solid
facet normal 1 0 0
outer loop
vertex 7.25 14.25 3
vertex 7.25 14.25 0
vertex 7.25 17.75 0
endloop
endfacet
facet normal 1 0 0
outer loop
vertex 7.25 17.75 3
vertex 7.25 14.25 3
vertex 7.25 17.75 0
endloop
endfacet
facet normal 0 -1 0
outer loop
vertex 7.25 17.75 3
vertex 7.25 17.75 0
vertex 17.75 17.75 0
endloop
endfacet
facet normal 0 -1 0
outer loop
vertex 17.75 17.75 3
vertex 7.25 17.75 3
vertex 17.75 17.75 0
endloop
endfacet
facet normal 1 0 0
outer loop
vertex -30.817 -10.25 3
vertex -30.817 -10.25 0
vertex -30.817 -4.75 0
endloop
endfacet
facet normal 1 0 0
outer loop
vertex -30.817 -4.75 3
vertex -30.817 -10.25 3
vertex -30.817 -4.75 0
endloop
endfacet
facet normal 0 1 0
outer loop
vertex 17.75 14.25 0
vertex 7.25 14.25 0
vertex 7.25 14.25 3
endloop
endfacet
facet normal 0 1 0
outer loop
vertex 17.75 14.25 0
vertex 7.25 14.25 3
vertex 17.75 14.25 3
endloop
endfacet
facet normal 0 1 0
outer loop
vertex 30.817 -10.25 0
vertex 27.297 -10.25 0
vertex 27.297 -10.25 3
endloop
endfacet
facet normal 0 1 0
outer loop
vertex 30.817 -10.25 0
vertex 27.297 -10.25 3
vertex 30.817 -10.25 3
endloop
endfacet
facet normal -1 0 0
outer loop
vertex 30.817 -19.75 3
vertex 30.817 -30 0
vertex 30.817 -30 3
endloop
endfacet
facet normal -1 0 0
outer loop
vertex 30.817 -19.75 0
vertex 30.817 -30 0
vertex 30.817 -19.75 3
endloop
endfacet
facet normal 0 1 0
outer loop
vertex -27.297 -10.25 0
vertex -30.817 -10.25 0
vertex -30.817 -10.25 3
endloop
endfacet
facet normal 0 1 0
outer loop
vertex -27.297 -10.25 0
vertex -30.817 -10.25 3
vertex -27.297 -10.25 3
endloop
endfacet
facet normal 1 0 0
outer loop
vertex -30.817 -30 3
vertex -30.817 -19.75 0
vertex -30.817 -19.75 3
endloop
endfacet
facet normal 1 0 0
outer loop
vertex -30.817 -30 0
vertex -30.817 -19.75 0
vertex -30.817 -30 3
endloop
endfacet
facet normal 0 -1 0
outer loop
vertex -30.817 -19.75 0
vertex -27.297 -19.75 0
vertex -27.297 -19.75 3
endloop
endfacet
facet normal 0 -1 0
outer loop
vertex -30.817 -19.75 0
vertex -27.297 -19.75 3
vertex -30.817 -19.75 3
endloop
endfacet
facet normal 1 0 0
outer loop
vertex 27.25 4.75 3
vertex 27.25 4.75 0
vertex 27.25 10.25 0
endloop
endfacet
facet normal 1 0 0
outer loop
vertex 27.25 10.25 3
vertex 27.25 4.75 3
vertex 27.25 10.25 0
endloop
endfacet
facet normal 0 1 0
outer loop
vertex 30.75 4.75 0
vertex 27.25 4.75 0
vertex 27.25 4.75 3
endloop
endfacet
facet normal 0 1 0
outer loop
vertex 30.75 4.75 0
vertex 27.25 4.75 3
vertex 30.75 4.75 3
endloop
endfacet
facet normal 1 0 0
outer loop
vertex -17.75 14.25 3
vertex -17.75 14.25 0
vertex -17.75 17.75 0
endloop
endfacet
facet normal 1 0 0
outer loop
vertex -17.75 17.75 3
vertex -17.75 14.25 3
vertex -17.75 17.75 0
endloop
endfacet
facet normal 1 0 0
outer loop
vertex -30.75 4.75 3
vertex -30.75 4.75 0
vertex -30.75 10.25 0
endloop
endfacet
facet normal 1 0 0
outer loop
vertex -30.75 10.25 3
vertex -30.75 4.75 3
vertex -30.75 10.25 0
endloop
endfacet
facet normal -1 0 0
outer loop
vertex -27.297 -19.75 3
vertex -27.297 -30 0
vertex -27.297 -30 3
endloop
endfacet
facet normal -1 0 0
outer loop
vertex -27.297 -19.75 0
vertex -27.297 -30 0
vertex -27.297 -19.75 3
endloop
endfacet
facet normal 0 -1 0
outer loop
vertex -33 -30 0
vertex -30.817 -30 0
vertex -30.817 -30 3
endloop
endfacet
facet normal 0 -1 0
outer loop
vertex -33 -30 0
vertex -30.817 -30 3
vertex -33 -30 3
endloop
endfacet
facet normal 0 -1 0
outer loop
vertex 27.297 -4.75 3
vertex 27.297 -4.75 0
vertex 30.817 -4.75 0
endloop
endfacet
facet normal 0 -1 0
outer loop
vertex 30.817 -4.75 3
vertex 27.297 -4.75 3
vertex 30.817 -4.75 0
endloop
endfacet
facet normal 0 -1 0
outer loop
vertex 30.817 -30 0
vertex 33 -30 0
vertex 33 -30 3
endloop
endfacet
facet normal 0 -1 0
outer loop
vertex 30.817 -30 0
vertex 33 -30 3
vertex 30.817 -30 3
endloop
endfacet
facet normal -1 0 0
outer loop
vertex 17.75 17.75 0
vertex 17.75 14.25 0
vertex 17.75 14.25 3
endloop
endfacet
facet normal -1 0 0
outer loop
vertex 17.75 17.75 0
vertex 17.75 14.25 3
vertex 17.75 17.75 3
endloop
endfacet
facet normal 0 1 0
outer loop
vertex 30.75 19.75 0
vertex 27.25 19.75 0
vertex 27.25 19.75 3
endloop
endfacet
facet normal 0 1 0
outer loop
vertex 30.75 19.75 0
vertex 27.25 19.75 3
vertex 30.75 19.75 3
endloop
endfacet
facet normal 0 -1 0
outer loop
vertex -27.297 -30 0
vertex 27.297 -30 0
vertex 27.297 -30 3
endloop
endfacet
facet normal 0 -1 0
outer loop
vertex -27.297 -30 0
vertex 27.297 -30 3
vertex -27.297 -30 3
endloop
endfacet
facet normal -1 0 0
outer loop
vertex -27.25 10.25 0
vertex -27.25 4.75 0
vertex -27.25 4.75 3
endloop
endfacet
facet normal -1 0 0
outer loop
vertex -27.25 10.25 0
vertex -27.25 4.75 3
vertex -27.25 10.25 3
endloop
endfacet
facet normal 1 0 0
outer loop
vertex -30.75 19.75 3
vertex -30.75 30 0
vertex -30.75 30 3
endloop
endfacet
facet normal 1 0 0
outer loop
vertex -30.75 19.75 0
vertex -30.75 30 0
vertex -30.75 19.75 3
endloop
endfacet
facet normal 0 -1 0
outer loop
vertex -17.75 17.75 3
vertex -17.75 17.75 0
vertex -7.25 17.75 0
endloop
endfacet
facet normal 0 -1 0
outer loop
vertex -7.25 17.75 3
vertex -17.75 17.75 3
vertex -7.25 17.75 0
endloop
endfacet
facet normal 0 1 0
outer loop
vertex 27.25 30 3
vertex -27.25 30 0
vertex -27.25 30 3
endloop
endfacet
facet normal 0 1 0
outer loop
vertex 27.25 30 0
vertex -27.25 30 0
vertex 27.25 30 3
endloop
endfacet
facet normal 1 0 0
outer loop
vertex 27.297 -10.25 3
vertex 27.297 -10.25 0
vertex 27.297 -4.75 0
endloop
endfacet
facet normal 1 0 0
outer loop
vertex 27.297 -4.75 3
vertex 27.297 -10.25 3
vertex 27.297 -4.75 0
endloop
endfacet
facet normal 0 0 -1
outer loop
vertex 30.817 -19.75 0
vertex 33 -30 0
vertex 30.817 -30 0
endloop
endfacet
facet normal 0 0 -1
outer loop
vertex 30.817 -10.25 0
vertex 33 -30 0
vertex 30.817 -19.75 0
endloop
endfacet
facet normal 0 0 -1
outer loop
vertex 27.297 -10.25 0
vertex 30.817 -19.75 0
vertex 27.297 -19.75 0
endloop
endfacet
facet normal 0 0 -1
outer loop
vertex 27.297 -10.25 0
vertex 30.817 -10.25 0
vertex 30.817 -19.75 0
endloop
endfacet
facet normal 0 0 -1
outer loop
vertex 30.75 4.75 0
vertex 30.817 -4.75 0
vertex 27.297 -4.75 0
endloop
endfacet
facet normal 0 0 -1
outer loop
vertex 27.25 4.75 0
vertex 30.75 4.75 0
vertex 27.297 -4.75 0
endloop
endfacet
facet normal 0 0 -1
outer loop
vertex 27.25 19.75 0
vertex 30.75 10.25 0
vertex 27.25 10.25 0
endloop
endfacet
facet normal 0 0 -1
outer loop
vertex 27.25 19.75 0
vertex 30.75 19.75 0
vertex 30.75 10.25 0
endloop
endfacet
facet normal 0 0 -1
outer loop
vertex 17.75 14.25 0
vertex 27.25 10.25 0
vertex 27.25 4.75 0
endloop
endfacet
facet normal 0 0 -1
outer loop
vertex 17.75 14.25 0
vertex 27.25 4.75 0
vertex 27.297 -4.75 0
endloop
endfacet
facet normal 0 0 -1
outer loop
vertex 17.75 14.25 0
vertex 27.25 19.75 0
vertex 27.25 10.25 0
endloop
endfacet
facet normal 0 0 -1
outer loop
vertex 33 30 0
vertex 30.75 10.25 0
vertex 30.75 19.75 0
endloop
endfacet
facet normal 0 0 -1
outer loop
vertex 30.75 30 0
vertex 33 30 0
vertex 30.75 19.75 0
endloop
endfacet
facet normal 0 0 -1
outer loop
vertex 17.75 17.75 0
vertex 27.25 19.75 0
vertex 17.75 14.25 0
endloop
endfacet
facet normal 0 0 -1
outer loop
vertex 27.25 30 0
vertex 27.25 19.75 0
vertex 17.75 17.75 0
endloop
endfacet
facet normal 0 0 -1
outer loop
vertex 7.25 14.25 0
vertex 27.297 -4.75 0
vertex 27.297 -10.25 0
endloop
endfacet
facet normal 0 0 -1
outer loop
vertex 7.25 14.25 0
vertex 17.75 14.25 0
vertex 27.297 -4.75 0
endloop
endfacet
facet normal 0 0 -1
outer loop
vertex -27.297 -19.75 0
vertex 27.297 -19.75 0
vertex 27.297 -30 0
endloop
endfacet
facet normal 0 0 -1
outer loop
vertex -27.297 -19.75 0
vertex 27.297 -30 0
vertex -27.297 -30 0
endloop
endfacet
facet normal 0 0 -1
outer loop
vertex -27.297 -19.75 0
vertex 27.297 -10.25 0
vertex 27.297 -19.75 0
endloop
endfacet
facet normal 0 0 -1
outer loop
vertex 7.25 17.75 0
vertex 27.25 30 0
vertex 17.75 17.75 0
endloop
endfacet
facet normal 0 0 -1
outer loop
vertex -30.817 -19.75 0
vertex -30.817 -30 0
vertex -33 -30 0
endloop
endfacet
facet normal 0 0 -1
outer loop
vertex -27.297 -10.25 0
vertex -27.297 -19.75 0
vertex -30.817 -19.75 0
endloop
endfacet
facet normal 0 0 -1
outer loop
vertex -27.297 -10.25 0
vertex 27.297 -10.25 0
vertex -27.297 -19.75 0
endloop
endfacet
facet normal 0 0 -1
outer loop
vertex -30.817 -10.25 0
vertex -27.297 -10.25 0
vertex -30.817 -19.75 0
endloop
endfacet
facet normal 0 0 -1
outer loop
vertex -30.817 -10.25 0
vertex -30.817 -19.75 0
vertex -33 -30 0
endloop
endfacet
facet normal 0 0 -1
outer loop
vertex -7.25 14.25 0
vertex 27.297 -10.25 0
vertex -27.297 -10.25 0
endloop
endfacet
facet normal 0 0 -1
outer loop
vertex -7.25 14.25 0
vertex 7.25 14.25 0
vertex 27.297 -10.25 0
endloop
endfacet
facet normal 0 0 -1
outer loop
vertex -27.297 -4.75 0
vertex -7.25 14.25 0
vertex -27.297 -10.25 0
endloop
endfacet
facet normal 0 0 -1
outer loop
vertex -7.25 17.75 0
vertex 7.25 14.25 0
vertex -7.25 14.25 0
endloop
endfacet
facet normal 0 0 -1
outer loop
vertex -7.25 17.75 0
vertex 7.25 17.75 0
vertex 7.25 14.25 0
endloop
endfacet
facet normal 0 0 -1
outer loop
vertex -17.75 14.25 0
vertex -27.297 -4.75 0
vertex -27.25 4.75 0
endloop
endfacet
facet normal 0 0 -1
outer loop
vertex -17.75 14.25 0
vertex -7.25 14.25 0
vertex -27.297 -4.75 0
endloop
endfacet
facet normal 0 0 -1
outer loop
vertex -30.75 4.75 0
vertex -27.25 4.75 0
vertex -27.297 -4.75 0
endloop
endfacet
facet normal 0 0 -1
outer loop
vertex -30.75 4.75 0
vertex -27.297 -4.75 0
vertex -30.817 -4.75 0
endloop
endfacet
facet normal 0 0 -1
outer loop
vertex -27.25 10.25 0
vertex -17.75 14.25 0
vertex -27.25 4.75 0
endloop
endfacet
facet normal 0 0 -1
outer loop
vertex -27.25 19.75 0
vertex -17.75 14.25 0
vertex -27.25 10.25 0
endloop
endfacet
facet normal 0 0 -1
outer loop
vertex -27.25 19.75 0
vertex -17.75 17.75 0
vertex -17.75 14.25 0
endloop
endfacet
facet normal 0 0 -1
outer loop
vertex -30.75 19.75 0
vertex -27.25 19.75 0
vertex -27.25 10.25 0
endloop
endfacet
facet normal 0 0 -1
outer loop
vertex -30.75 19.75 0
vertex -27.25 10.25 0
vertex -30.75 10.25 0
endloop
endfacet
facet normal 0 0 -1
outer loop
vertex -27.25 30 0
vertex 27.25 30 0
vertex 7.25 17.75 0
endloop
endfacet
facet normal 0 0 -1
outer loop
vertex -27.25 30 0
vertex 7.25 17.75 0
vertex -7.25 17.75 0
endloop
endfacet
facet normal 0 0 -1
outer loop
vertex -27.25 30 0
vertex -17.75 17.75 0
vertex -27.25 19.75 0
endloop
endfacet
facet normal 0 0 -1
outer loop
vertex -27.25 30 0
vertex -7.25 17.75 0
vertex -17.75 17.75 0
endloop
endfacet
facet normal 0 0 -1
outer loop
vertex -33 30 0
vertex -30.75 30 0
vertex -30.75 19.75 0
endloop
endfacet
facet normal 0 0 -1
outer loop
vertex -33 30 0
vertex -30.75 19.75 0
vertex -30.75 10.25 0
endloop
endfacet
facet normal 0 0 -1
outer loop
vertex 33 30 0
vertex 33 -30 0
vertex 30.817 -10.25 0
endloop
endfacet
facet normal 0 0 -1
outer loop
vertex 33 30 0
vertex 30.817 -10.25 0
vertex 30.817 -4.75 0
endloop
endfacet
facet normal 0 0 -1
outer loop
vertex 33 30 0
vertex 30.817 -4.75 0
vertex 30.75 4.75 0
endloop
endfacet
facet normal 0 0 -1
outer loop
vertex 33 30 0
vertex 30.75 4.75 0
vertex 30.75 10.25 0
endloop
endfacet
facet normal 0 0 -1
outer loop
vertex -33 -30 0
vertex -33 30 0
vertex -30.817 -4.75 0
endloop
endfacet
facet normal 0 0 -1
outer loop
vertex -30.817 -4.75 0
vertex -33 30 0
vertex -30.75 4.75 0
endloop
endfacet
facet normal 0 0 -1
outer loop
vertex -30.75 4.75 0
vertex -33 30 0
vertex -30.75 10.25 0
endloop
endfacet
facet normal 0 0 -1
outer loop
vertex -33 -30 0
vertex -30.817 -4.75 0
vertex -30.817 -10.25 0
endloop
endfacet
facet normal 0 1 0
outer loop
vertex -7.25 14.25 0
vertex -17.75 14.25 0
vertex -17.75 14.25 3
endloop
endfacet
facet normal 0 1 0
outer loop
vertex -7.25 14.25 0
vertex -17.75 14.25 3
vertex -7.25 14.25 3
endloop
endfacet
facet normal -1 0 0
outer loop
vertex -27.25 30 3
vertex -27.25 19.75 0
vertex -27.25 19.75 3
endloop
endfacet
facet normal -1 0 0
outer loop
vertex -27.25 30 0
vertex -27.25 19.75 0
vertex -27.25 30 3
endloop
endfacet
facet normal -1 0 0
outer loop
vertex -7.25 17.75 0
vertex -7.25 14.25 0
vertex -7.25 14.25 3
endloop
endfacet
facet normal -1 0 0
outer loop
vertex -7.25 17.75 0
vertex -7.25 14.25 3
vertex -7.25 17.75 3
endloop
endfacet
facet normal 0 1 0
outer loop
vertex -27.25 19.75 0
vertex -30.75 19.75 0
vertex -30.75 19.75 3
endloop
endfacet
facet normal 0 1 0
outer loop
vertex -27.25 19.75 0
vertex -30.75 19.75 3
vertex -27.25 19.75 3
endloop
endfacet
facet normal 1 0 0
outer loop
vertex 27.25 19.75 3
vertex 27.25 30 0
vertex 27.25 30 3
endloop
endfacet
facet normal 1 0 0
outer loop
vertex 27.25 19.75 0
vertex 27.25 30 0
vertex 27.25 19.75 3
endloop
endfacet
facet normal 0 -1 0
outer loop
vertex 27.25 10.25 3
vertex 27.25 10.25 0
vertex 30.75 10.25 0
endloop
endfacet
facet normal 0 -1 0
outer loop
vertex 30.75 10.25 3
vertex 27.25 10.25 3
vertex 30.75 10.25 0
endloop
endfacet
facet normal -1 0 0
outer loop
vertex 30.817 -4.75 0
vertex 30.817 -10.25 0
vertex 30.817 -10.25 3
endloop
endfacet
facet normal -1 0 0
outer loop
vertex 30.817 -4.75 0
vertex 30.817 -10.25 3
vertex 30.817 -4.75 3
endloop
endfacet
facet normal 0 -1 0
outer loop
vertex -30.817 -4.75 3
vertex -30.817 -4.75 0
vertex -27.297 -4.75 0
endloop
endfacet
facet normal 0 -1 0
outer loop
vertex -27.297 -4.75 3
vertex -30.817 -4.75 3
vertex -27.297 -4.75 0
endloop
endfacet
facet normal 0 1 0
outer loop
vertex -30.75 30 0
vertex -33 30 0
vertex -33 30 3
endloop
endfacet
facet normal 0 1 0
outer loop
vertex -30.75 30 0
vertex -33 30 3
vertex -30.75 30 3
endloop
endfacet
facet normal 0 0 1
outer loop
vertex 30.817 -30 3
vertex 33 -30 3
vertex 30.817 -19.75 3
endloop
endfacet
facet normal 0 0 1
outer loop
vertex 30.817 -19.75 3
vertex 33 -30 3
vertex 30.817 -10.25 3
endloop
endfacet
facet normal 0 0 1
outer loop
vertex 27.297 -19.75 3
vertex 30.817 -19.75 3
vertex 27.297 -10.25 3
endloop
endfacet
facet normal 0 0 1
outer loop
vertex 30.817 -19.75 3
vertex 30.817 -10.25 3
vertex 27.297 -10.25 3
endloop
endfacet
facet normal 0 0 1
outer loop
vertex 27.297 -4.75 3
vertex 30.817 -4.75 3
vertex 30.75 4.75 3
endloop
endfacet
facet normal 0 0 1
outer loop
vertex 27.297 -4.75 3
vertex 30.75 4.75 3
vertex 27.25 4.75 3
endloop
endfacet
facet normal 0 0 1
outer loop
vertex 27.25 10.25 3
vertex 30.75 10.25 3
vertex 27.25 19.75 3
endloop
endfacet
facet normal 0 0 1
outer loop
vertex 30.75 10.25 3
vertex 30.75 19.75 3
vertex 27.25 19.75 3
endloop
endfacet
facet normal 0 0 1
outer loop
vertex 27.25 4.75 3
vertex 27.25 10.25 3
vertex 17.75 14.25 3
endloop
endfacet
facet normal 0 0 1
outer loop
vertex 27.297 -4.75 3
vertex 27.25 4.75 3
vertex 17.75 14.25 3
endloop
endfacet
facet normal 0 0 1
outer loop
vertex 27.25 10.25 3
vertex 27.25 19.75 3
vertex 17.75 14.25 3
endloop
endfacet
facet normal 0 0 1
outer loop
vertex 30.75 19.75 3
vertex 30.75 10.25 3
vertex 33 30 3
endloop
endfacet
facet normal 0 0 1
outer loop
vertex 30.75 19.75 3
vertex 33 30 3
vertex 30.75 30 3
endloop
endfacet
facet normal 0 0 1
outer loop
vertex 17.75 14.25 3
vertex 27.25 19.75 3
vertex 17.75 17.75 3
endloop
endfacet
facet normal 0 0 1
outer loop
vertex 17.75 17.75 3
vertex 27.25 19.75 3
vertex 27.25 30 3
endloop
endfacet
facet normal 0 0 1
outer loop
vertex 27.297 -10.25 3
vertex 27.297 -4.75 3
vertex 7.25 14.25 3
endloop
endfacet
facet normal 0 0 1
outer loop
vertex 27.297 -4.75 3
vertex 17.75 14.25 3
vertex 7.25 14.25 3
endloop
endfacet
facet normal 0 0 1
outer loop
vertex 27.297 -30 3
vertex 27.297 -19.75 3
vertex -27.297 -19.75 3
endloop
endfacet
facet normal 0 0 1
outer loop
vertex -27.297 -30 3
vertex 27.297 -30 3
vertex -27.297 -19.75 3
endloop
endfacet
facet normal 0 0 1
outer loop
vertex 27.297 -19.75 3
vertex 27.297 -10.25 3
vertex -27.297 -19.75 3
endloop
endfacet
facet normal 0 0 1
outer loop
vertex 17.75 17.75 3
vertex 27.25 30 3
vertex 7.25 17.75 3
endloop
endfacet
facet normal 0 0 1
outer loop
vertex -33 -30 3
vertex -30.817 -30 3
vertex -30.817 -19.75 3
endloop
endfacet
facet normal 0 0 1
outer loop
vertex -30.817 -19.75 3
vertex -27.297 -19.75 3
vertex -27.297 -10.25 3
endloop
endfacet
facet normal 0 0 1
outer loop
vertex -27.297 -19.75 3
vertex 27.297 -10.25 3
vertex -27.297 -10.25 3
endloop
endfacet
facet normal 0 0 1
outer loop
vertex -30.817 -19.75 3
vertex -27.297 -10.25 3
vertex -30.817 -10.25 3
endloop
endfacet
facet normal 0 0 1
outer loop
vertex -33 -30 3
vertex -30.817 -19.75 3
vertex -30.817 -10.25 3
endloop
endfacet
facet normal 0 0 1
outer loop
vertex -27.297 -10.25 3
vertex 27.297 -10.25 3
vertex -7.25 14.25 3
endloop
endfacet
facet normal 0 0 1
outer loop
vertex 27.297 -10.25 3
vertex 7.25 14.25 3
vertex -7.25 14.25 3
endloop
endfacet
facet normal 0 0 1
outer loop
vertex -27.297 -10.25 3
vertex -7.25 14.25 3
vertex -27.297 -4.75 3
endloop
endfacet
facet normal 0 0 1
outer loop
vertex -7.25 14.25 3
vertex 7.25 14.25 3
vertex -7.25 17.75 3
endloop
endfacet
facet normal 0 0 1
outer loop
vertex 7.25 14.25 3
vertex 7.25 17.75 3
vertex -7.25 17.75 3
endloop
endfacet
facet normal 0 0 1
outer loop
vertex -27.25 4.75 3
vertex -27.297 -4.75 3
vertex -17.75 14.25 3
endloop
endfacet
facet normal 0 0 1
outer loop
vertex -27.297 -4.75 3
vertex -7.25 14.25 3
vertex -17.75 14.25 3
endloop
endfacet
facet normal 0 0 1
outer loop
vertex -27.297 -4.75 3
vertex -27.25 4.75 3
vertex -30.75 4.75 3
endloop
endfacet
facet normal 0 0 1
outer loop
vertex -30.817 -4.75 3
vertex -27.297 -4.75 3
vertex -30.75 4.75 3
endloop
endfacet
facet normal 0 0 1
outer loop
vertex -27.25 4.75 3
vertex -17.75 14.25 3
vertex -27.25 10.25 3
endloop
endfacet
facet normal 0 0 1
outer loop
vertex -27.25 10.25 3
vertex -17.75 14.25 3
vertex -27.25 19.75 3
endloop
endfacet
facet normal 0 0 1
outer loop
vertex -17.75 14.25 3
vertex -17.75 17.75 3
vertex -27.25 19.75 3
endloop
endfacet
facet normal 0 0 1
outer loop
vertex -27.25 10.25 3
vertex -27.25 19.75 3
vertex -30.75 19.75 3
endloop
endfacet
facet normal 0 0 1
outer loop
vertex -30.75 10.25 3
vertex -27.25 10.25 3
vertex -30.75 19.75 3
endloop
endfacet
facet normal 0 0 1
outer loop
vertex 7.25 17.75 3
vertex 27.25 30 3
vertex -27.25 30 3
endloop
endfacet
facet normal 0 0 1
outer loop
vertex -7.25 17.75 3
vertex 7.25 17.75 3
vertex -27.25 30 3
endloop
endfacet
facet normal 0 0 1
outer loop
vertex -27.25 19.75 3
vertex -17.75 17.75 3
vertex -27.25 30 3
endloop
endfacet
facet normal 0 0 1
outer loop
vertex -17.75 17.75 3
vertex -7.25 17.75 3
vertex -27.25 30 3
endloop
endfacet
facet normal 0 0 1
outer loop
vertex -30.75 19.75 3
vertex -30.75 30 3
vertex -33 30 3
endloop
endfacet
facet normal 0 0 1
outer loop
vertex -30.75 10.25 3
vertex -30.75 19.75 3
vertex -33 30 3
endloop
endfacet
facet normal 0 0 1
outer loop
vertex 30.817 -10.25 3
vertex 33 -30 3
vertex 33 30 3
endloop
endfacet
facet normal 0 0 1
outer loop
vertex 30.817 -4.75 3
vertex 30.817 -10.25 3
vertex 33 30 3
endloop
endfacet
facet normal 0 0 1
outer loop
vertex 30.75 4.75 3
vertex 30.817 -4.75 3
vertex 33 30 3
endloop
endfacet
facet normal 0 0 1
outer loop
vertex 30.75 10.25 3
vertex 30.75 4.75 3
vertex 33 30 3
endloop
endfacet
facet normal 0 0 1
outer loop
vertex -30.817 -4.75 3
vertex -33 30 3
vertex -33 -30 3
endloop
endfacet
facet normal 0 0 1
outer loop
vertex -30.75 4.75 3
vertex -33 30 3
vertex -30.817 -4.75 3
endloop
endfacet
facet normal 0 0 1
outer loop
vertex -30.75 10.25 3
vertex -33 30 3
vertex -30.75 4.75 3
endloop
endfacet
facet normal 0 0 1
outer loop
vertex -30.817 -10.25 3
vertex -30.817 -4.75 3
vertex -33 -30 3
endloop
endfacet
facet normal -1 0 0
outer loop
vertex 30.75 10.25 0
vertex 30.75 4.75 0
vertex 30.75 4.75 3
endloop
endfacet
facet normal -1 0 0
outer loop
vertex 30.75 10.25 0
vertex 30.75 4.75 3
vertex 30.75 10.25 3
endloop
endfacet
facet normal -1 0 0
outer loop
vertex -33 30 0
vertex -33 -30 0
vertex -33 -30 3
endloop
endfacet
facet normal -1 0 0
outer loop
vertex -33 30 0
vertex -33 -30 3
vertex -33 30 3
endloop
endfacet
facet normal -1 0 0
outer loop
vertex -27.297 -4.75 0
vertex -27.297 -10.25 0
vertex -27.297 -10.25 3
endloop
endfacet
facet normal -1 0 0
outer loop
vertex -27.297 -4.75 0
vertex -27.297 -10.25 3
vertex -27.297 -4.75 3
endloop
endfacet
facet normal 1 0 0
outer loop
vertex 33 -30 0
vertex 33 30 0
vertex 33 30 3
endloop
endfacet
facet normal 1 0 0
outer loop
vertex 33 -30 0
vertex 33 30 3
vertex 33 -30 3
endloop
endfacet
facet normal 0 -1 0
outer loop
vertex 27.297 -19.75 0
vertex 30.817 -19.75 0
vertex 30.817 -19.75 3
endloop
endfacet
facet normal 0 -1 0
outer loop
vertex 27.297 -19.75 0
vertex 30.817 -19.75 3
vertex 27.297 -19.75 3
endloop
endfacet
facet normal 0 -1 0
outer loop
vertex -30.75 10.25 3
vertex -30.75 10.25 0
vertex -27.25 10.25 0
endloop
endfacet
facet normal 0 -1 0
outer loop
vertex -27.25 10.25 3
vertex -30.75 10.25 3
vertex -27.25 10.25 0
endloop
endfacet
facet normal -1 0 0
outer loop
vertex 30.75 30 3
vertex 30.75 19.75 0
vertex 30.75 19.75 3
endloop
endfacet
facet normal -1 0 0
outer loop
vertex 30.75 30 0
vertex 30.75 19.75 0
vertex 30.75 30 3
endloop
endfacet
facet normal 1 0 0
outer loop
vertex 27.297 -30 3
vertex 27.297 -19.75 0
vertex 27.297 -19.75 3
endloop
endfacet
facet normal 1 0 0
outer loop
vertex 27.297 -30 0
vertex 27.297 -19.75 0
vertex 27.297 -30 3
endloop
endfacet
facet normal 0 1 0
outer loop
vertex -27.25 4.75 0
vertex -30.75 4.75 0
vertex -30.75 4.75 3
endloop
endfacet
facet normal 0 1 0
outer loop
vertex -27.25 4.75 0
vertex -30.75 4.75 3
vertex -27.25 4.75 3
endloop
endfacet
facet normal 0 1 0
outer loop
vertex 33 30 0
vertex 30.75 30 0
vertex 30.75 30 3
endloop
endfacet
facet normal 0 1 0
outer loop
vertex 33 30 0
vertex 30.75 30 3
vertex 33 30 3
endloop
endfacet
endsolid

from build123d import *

# Parameters (mm, degrees)
SKETCH_1_W      = 10.5
SKETCH_1_H      = 3.5
SKETCH_1_W_2    = 3.5
SKETCH_1_H_2    = 5.5
SKETCH_1_W_3    = 3.520169939
EXTRUDE_1_DEPTH = 3


with BuildPart() as part:
    # Эскиз1 → Бобышка-Вытянуть1 (new body)
    with BuildSketch(Plane.XY):
        Polygon((-27.25, 30), (27.25, 30), (27.25, 19.75), (30.75, 19.75), (30.75, 30), (33, 30), (33, -30), (30.816819074, -30), (30.816819074, -19.75), (27.296649135, -19.75), (27.296649135, -30), (-27.296649135, -30), (-27.296649135, -19.75), (-30.816819074, -19.75), (-30.816819074, -30), (-33, -30), (-33, 30), (-30.75, 30), (-30.75, 19.75), (-27.25, 19.75), align=None)
        with Locations((-12.5, 16)):
            Rectangle(SKETCH_1_W, SKETCH_1_H, mode=Mode.SUBTRACT)
        with Locations((-29, 7.5)):
            Rectangle(SKETCH_1_W_2, SKETCH_1_H_2, mode=Mode.SUBTRACT)
        with Locations((-29.056734105, -7.5)):
            Rectangle(SKETCH_1_W_3, SKETCH_1_H_2, mode=Mode.SUBTRACT)
        with Locations((29.056734105, -7.5)):
            Rectangle(SKETCH_1_W_3, SKETCH_1_H_2, mode=Mode.SUBTRACT)
        with Locations((29, 7.5)):
            Rectangle(SKETCH_1_W_2, SKETCH_1_H_2, mode=Mode.SUBTRACT)
        with Locations((12.5, 16)):
            Rectangle(SKETCH_1_W, SKETCH_1_H, mode=Mode.SUBTRACT)
    extrude(amount=EXTRUDE_1_DEPTH)


solid = part.part
